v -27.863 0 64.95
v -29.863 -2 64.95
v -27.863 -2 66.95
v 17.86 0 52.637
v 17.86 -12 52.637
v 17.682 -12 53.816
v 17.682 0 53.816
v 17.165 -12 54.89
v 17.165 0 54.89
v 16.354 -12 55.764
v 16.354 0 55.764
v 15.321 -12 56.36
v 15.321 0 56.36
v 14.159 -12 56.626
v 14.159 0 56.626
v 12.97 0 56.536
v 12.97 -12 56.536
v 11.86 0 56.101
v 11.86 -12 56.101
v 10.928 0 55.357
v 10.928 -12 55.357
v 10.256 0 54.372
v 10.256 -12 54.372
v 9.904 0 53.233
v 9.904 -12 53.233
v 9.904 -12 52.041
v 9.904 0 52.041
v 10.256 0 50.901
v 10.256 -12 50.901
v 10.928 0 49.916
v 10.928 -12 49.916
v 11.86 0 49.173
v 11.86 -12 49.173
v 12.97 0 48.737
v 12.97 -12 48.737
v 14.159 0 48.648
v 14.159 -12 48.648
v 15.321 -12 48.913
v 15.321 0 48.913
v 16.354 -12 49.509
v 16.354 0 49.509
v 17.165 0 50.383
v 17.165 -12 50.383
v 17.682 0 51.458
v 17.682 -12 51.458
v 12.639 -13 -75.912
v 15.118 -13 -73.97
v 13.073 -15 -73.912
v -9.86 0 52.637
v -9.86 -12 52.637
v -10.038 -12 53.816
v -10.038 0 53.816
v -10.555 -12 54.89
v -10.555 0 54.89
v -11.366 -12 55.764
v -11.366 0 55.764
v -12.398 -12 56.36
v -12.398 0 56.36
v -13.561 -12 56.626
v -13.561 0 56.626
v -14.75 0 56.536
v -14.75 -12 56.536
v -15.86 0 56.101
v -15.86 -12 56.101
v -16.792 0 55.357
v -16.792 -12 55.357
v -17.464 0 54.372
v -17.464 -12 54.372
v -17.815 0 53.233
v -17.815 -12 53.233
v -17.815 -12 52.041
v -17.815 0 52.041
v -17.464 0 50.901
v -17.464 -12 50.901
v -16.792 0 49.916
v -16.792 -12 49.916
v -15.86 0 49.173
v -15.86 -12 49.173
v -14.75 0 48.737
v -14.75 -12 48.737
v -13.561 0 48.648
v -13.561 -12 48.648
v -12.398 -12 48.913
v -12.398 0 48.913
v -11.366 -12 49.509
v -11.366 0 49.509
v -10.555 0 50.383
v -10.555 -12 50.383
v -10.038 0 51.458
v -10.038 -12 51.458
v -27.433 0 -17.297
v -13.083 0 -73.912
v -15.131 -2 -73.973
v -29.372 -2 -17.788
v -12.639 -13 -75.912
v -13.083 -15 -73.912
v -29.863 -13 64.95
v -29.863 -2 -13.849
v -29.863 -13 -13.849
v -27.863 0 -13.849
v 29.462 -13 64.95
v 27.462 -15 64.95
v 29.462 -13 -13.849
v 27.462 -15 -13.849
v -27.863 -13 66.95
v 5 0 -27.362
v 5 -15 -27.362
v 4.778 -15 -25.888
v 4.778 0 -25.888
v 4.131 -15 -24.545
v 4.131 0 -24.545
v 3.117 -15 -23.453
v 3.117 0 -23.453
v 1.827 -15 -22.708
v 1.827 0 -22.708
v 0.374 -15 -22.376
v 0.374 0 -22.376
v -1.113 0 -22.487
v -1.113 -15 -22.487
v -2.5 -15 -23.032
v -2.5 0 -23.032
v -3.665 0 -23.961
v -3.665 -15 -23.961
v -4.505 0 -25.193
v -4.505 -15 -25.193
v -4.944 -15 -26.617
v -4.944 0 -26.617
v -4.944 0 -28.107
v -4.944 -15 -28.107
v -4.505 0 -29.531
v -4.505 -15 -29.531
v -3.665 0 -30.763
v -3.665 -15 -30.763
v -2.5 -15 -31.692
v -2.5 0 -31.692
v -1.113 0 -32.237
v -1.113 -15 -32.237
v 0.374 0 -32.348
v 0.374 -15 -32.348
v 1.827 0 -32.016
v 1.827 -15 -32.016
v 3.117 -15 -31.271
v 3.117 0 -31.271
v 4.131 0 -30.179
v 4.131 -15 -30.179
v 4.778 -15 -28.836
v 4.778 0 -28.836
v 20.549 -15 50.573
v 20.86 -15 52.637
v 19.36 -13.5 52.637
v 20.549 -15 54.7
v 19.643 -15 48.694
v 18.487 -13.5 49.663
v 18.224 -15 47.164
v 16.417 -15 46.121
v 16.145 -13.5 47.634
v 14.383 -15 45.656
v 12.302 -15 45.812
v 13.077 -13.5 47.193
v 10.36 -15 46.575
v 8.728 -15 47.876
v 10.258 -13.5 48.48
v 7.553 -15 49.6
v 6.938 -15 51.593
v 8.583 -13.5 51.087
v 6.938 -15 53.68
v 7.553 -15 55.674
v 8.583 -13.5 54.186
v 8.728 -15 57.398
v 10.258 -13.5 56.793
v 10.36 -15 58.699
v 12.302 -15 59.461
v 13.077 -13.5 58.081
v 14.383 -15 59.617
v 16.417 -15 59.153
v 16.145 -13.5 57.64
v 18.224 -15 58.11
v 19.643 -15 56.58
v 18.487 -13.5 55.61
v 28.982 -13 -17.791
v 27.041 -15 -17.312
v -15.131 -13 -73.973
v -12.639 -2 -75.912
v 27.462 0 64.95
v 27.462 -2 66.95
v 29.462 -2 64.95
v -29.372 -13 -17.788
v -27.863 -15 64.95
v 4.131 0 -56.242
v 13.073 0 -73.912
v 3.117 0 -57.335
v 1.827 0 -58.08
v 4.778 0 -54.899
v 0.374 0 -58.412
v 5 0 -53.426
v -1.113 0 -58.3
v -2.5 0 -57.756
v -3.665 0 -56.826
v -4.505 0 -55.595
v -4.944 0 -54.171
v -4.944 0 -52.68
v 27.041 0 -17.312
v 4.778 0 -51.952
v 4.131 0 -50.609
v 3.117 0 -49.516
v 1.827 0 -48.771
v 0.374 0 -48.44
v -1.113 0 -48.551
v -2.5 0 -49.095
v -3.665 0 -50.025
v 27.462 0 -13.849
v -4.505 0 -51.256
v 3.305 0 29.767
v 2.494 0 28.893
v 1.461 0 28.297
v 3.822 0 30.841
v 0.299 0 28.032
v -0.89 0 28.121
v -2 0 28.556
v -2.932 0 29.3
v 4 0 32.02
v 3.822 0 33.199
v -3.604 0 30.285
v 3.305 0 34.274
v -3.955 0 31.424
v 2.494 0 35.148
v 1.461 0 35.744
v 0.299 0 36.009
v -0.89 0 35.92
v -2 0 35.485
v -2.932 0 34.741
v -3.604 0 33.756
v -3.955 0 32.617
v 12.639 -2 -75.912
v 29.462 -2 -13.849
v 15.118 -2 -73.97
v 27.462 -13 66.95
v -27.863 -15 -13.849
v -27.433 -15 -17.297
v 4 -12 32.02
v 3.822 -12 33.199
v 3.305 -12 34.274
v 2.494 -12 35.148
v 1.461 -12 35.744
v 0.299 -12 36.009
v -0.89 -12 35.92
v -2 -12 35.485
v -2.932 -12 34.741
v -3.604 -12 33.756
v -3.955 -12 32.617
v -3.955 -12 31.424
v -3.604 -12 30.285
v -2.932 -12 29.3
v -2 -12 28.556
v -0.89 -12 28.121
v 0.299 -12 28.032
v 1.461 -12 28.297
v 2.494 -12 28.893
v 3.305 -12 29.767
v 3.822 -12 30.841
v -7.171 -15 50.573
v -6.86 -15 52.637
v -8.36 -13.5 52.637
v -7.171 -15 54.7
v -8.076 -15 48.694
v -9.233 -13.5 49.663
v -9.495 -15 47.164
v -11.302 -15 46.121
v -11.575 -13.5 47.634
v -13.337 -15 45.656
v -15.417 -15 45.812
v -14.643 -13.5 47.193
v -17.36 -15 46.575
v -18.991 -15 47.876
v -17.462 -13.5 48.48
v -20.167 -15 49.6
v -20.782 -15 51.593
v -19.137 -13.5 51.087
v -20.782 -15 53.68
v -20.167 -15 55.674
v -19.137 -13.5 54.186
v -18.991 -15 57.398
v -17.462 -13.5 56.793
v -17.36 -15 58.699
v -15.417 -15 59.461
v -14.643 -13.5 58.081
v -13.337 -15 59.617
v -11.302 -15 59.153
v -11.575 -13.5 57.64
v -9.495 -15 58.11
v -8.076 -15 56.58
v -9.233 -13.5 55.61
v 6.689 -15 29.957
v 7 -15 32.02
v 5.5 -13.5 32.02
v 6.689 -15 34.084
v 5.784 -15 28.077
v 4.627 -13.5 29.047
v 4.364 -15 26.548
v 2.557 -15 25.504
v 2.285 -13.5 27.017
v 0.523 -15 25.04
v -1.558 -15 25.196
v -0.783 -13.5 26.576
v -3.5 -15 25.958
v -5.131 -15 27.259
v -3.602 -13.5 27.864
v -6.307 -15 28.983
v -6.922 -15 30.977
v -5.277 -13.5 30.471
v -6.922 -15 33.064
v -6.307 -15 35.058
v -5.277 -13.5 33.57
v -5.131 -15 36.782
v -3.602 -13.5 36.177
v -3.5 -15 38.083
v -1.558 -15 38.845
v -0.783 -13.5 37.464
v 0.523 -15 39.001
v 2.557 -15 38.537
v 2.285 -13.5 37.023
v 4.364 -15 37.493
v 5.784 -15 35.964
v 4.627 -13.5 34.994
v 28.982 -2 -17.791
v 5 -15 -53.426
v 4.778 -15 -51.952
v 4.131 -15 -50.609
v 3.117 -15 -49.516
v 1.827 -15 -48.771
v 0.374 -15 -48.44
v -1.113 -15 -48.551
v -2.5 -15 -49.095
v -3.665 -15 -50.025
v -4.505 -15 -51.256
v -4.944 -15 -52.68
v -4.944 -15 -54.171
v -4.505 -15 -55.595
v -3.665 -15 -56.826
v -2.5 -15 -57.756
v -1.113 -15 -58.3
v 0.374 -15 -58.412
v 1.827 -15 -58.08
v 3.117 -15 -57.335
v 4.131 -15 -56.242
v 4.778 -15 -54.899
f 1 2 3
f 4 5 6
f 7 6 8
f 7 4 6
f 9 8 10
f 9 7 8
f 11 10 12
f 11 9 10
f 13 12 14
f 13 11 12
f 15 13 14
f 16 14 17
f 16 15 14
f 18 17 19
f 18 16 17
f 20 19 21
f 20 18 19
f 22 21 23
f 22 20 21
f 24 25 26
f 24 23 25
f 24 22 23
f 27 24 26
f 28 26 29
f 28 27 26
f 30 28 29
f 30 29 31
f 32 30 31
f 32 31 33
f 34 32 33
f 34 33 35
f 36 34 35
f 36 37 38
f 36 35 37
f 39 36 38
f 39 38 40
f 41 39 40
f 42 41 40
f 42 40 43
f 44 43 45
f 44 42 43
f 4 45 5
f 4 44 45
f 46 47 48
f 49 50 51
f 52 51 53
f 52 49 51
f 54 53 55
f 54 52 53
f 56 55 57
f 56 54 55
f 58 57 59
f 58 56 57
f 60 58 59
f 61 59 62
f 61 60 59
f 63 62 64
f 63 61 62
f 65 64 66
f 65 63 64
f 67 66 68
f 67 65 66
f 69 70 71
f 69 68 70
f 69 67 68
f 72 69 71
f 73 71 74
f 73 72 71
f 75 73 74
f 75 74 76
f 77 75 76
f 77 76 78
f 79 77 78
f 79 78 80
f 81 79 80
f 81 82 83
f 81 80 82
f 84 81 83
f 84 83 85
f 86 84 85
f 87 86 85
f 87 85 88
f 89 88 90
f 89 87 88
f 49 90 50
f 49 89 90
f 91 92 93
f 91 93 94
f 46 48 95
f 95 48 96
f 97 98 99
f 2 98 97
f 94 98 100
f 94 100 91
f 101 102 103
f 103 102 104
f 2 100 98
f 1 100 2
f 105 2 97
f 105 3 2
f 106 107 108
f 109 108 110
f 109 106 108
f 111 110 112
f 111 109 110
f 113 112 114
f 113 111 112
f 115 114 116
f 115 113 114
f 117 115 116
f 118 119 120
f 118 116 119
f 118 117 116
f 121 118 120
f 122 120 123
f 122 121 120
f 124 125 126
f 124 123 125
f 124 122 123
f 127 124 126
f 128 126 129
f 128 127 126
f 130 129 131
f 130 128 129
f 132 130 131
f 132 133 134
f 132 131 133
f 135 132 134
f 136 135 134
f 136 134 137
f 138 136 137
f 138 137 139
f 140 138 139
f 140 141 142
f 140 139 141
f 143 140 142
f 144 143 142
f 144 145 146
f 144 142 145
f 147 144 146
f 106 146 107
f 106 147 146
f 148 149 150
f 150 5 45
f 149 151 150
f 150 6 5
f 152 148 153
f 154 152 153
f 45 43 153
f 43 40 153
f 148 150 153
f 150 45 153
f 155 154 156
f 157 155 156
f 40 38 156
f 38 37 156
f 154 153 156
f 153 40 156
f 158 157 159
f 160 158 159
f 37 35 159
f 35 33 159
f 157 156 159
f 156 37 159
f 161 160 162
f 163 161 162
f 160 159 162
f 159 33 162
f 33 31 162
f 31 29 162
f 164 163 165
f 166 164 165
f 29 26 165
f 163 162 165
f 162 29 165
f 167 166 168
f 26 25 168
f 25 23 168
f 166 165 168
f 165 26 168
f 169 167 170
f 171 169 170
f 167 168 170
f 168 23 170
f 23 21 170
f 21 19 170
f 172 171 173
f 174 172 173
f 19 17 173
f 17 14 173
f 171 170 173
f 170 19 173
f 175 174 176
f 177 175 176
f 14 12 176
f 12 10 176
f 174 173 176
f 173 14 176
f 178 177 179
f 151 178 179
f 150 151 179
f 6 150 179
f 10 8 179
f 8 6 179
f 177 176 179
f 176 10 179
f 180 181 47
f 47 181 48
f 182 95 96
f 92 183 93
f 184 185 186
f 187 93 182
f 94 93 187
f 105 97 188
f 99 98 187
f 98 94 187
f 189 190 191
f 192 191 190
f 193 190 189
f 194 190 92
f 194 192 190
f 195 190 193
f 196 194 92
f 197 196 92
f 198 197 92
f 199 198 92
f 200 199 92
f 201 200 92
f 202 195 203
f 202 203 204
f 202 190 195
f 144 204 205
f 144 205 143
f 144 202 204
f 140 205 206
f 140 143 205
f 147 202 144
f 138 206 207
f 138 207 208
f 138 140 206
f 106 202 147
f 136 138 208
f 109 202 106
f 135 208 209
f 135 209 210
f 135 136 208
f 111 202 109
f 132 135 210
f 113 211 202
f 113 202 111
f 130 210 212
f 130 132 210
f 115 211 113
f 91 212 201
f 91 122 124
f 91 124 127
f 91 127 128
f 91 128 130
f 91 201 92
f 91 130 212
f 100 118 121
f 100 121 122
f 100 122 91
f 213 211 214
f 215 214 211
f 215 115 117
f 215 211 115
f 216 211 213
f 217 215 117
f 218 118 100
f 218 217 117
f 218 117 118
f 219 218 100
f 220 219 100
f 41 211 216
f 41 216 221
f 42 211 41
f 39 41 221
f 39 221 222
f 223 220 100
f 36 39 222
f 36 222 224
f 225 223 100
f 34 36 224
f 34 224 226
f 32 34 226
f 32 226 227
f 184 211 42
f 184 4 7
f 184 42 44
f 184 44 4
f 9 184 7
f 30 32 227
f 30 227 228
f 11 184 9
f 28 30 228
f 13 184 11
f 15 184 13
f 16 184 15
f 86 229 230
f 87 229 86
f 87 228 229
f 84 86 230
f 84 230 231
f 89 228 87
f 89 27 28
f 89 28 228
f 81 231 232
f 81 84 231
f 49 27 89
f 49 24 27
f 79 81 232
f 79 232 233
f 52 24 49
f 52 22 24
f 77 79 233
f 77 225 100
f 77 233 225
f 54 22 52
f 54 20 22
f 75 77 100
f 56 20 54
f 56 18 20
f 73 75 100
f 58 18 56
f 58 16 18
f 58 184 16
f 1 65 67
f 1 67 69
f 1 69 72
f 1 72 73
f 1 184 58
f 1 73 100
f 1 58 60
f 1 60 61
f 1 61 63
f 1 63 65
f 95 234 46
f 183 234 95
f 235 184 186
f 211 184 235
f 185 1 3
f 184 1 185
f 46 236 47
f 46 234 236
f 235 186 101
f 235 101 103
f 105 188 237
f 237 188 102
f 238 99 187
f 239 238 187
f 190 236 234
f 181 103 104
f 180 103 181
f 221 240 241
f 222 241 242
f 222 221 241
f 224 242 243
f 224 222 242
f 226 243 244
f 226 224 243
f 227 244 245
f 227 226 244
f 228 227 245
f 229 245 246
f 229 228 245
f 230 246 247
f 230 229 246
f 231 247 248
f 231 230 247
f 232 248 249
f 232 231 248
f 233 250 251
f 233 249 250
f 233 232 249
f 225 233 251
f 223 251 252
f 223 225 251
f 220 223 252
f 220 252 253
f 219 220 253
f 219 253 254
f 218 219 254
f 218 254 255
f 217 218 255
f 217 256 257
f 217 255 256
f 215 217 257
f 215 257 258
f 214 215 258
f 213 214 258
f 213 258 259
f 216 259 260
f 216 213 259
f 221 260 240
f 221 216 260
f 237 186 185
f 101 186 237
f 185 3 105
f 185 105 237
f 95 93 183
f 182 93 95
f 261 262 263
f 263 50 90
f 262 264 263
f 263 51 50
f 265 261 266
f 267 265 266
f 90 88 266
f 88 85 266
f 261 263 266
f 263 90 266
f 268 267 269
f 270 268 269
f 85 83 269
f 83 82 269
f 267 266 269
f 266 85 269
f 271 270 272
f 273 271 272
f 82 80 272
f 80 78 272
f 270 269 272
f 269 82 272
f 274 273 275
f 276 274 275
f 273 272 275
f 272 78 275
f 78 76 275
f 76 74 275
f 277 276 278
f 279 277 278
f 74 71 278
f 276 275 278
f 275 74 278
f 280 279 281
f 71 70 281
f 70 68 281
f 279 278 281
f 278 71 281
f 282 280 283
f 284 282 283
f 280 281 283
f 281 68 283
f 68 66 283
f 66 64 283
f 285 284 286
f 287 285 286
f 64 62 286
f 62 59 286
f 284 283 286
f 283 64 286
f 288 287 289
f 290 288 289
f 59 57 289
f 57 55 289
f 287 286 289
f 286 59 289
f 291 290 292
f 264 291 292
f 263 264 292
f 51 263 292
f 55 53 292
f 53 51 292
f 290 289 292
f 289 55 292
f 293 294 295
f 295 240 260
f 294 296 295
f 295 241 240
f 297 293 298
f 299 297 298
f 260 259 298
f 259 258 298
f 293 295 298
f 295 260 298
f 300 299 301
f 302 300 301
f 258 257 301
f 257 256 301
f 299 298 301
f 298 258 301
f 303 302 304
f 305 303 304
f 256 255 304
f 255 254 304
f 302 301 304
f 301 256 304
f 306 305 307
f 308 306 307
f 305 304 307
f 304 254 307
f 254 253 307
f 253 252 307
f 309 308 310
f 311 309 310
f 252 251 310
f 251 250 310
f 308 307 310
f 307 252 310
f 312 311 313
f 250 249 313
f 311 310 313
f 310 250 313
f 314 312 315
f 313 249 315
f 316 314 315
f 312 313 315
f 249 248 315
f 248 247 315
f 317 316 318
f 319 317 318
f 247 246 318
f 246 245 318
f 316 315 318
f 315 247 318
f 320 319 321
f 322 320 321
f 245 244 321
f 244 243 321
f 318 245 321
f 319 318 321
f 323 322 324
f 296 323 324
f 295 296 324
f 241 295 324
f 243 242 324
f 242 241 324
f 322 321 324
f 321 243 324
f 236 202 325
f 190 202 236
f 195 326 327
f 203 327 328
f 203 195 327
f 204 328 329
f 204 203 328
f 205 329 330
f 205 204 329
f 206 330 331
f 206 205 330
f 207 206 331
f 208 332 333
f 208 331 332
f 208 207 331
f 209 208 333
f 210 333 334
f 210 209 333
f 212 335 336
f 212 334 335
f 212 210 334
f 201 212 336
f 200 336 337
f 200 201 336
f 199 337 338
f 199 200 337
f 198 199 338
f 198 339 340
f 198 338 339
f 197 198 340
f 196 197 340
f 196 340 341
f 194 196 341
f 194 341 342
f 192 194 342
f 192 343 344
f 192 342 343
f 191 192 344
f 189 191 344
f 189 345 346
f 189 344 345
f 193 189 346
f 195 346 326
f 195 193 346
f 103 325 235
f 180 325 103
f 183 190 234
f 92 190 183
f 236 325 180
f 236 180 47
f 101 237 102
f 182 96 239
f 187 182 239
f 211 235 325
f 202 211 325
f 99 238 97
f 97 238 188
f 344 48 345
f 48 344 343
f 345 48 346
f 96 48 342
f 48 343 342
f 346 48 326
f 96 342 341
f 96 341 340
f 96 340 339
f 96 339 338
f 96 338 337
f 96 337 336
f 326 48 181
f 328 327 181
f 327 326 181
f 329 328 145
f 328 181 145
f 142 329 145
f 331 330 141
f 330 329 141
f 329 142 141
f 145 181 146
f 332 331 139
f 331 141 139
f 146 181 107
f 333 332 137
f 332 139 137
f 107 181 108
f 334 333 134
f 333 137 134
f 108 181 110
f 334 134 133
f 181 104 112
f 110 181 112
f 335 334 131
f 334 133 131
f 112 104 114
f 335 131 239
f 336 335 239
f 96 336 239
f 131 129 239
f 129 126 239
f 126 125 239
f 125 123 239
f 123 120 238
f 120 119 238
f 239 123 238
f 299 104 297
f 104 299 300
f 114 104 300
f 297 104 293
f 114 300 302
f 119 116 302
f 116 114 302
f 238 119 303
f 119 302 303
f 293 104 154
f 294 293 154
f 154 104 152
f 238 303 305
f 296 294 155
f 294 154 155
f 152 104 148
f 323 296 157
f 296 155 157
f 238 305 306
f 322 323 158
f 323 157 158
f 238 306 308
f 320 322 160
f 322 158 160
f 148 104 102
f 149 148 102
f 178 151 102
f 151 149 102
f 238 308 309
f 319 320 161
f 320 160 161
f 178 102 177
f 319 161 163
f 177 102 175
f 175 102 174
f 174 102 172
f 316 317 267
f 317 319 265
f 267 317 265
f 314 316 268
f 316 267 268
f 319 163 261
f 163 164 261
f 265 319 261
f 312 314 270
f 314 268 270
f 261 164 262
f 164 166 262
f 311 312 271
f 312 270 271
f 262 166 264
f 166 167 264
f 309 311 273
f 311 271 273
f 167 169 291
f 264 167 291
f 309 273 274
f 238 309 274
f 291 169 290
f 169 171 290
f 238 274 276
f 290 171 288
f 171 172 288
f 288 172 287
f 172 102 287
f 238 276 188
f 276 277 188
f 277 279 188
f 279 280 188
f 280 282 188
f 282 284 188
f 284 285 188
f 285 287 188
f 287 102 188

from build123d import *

# Parameters (mm, degrees)
PAD_DEPTH       = 15
CHAMFER_SIZE    = 2
SKETCH001_R     = 4
SKETCH001_R_2   = 5
POCKET_DEPTH    = 15.001
CHAMFER001_SIZE = 3


with BuildPart() as part:
    # Sketch → Pad (new body)
    with BuildSketch(Plane.XZ):
        Polygon((-29.863335, -15.849396), (-29.863335, 66.950175), (29.461527, 66.950175), (29.461527, -15.849396), (14.639226, -75.912064), (-14.639226, -75.912064), align=None)
    extrude(amount=PAD_DEPTH)

    # Chamfer
    chamfer_edges = [part.edges().sort_by_distance(p)[0] for p in [
        (-29.863335, -7.5, -15.849396),
        (-29.863335, -7.5, 66.950175),
        (-29.863335, 0, 25.55039),
        (-29.863335, -15, 25.55039),
        (29.461527, -7.5, 66.950175),
        (-0.200904, 0, 66.950175),
        (-0.200904, -15, 66.950175),
        (29.461527, -7.5, -15.849396),
        (29.461527, 0, 25.55039),
        (29.461527, -15, 25.55039),
        (14.639226, -7.5, -75.912064),
        (22.050376, 0, -45.88073),
        (22.050376, -15, -45.88073),
        (-14.639226, -7.5, -75.912064),
        (0, 0, -75.912064),
        (0, -15, -75.912064),
        (-22.251281, 0, -45.88073),
        (-22.251281, -15, -45.88073),
    ]]
    chamfer(chamfer_edges, length=CHAMFER_SIZE)

    # Sketch001 → Pocket (cut, through all)
    with BuildSketch(Plane.XZ):
        with Locations((-13.859818, 52.636753)):
            Circle(SKETCH001_R)
        with Locations((13.859818, 52.636753)):
            Circle(SKETCH001_R)
        with Locations((0, 32.020428)):
            Circle(SKETCH001_R)
        with Locations((0, -27.362068)):
            Circle(SKETCH001_R_2)
        with Locations((0, -53.42556)):
            Circle(SKETCH001_R_2)
    extrude(amount=POCKET_DEPTH, mode=Mode.SUBTRACT)

    # Chamfer001
    chamfer001_edges = [part.edges().sort_by_distance(p)[0] for p in [
        (-17.859818, -15, 52.636753),
        (9.859818, -15, 52.636753),
        (-4, -15, 32.020428),
    ]]
    chamfer(chamfer001_edges, length=CHAMFER001_SIZE)


solid = part.part
